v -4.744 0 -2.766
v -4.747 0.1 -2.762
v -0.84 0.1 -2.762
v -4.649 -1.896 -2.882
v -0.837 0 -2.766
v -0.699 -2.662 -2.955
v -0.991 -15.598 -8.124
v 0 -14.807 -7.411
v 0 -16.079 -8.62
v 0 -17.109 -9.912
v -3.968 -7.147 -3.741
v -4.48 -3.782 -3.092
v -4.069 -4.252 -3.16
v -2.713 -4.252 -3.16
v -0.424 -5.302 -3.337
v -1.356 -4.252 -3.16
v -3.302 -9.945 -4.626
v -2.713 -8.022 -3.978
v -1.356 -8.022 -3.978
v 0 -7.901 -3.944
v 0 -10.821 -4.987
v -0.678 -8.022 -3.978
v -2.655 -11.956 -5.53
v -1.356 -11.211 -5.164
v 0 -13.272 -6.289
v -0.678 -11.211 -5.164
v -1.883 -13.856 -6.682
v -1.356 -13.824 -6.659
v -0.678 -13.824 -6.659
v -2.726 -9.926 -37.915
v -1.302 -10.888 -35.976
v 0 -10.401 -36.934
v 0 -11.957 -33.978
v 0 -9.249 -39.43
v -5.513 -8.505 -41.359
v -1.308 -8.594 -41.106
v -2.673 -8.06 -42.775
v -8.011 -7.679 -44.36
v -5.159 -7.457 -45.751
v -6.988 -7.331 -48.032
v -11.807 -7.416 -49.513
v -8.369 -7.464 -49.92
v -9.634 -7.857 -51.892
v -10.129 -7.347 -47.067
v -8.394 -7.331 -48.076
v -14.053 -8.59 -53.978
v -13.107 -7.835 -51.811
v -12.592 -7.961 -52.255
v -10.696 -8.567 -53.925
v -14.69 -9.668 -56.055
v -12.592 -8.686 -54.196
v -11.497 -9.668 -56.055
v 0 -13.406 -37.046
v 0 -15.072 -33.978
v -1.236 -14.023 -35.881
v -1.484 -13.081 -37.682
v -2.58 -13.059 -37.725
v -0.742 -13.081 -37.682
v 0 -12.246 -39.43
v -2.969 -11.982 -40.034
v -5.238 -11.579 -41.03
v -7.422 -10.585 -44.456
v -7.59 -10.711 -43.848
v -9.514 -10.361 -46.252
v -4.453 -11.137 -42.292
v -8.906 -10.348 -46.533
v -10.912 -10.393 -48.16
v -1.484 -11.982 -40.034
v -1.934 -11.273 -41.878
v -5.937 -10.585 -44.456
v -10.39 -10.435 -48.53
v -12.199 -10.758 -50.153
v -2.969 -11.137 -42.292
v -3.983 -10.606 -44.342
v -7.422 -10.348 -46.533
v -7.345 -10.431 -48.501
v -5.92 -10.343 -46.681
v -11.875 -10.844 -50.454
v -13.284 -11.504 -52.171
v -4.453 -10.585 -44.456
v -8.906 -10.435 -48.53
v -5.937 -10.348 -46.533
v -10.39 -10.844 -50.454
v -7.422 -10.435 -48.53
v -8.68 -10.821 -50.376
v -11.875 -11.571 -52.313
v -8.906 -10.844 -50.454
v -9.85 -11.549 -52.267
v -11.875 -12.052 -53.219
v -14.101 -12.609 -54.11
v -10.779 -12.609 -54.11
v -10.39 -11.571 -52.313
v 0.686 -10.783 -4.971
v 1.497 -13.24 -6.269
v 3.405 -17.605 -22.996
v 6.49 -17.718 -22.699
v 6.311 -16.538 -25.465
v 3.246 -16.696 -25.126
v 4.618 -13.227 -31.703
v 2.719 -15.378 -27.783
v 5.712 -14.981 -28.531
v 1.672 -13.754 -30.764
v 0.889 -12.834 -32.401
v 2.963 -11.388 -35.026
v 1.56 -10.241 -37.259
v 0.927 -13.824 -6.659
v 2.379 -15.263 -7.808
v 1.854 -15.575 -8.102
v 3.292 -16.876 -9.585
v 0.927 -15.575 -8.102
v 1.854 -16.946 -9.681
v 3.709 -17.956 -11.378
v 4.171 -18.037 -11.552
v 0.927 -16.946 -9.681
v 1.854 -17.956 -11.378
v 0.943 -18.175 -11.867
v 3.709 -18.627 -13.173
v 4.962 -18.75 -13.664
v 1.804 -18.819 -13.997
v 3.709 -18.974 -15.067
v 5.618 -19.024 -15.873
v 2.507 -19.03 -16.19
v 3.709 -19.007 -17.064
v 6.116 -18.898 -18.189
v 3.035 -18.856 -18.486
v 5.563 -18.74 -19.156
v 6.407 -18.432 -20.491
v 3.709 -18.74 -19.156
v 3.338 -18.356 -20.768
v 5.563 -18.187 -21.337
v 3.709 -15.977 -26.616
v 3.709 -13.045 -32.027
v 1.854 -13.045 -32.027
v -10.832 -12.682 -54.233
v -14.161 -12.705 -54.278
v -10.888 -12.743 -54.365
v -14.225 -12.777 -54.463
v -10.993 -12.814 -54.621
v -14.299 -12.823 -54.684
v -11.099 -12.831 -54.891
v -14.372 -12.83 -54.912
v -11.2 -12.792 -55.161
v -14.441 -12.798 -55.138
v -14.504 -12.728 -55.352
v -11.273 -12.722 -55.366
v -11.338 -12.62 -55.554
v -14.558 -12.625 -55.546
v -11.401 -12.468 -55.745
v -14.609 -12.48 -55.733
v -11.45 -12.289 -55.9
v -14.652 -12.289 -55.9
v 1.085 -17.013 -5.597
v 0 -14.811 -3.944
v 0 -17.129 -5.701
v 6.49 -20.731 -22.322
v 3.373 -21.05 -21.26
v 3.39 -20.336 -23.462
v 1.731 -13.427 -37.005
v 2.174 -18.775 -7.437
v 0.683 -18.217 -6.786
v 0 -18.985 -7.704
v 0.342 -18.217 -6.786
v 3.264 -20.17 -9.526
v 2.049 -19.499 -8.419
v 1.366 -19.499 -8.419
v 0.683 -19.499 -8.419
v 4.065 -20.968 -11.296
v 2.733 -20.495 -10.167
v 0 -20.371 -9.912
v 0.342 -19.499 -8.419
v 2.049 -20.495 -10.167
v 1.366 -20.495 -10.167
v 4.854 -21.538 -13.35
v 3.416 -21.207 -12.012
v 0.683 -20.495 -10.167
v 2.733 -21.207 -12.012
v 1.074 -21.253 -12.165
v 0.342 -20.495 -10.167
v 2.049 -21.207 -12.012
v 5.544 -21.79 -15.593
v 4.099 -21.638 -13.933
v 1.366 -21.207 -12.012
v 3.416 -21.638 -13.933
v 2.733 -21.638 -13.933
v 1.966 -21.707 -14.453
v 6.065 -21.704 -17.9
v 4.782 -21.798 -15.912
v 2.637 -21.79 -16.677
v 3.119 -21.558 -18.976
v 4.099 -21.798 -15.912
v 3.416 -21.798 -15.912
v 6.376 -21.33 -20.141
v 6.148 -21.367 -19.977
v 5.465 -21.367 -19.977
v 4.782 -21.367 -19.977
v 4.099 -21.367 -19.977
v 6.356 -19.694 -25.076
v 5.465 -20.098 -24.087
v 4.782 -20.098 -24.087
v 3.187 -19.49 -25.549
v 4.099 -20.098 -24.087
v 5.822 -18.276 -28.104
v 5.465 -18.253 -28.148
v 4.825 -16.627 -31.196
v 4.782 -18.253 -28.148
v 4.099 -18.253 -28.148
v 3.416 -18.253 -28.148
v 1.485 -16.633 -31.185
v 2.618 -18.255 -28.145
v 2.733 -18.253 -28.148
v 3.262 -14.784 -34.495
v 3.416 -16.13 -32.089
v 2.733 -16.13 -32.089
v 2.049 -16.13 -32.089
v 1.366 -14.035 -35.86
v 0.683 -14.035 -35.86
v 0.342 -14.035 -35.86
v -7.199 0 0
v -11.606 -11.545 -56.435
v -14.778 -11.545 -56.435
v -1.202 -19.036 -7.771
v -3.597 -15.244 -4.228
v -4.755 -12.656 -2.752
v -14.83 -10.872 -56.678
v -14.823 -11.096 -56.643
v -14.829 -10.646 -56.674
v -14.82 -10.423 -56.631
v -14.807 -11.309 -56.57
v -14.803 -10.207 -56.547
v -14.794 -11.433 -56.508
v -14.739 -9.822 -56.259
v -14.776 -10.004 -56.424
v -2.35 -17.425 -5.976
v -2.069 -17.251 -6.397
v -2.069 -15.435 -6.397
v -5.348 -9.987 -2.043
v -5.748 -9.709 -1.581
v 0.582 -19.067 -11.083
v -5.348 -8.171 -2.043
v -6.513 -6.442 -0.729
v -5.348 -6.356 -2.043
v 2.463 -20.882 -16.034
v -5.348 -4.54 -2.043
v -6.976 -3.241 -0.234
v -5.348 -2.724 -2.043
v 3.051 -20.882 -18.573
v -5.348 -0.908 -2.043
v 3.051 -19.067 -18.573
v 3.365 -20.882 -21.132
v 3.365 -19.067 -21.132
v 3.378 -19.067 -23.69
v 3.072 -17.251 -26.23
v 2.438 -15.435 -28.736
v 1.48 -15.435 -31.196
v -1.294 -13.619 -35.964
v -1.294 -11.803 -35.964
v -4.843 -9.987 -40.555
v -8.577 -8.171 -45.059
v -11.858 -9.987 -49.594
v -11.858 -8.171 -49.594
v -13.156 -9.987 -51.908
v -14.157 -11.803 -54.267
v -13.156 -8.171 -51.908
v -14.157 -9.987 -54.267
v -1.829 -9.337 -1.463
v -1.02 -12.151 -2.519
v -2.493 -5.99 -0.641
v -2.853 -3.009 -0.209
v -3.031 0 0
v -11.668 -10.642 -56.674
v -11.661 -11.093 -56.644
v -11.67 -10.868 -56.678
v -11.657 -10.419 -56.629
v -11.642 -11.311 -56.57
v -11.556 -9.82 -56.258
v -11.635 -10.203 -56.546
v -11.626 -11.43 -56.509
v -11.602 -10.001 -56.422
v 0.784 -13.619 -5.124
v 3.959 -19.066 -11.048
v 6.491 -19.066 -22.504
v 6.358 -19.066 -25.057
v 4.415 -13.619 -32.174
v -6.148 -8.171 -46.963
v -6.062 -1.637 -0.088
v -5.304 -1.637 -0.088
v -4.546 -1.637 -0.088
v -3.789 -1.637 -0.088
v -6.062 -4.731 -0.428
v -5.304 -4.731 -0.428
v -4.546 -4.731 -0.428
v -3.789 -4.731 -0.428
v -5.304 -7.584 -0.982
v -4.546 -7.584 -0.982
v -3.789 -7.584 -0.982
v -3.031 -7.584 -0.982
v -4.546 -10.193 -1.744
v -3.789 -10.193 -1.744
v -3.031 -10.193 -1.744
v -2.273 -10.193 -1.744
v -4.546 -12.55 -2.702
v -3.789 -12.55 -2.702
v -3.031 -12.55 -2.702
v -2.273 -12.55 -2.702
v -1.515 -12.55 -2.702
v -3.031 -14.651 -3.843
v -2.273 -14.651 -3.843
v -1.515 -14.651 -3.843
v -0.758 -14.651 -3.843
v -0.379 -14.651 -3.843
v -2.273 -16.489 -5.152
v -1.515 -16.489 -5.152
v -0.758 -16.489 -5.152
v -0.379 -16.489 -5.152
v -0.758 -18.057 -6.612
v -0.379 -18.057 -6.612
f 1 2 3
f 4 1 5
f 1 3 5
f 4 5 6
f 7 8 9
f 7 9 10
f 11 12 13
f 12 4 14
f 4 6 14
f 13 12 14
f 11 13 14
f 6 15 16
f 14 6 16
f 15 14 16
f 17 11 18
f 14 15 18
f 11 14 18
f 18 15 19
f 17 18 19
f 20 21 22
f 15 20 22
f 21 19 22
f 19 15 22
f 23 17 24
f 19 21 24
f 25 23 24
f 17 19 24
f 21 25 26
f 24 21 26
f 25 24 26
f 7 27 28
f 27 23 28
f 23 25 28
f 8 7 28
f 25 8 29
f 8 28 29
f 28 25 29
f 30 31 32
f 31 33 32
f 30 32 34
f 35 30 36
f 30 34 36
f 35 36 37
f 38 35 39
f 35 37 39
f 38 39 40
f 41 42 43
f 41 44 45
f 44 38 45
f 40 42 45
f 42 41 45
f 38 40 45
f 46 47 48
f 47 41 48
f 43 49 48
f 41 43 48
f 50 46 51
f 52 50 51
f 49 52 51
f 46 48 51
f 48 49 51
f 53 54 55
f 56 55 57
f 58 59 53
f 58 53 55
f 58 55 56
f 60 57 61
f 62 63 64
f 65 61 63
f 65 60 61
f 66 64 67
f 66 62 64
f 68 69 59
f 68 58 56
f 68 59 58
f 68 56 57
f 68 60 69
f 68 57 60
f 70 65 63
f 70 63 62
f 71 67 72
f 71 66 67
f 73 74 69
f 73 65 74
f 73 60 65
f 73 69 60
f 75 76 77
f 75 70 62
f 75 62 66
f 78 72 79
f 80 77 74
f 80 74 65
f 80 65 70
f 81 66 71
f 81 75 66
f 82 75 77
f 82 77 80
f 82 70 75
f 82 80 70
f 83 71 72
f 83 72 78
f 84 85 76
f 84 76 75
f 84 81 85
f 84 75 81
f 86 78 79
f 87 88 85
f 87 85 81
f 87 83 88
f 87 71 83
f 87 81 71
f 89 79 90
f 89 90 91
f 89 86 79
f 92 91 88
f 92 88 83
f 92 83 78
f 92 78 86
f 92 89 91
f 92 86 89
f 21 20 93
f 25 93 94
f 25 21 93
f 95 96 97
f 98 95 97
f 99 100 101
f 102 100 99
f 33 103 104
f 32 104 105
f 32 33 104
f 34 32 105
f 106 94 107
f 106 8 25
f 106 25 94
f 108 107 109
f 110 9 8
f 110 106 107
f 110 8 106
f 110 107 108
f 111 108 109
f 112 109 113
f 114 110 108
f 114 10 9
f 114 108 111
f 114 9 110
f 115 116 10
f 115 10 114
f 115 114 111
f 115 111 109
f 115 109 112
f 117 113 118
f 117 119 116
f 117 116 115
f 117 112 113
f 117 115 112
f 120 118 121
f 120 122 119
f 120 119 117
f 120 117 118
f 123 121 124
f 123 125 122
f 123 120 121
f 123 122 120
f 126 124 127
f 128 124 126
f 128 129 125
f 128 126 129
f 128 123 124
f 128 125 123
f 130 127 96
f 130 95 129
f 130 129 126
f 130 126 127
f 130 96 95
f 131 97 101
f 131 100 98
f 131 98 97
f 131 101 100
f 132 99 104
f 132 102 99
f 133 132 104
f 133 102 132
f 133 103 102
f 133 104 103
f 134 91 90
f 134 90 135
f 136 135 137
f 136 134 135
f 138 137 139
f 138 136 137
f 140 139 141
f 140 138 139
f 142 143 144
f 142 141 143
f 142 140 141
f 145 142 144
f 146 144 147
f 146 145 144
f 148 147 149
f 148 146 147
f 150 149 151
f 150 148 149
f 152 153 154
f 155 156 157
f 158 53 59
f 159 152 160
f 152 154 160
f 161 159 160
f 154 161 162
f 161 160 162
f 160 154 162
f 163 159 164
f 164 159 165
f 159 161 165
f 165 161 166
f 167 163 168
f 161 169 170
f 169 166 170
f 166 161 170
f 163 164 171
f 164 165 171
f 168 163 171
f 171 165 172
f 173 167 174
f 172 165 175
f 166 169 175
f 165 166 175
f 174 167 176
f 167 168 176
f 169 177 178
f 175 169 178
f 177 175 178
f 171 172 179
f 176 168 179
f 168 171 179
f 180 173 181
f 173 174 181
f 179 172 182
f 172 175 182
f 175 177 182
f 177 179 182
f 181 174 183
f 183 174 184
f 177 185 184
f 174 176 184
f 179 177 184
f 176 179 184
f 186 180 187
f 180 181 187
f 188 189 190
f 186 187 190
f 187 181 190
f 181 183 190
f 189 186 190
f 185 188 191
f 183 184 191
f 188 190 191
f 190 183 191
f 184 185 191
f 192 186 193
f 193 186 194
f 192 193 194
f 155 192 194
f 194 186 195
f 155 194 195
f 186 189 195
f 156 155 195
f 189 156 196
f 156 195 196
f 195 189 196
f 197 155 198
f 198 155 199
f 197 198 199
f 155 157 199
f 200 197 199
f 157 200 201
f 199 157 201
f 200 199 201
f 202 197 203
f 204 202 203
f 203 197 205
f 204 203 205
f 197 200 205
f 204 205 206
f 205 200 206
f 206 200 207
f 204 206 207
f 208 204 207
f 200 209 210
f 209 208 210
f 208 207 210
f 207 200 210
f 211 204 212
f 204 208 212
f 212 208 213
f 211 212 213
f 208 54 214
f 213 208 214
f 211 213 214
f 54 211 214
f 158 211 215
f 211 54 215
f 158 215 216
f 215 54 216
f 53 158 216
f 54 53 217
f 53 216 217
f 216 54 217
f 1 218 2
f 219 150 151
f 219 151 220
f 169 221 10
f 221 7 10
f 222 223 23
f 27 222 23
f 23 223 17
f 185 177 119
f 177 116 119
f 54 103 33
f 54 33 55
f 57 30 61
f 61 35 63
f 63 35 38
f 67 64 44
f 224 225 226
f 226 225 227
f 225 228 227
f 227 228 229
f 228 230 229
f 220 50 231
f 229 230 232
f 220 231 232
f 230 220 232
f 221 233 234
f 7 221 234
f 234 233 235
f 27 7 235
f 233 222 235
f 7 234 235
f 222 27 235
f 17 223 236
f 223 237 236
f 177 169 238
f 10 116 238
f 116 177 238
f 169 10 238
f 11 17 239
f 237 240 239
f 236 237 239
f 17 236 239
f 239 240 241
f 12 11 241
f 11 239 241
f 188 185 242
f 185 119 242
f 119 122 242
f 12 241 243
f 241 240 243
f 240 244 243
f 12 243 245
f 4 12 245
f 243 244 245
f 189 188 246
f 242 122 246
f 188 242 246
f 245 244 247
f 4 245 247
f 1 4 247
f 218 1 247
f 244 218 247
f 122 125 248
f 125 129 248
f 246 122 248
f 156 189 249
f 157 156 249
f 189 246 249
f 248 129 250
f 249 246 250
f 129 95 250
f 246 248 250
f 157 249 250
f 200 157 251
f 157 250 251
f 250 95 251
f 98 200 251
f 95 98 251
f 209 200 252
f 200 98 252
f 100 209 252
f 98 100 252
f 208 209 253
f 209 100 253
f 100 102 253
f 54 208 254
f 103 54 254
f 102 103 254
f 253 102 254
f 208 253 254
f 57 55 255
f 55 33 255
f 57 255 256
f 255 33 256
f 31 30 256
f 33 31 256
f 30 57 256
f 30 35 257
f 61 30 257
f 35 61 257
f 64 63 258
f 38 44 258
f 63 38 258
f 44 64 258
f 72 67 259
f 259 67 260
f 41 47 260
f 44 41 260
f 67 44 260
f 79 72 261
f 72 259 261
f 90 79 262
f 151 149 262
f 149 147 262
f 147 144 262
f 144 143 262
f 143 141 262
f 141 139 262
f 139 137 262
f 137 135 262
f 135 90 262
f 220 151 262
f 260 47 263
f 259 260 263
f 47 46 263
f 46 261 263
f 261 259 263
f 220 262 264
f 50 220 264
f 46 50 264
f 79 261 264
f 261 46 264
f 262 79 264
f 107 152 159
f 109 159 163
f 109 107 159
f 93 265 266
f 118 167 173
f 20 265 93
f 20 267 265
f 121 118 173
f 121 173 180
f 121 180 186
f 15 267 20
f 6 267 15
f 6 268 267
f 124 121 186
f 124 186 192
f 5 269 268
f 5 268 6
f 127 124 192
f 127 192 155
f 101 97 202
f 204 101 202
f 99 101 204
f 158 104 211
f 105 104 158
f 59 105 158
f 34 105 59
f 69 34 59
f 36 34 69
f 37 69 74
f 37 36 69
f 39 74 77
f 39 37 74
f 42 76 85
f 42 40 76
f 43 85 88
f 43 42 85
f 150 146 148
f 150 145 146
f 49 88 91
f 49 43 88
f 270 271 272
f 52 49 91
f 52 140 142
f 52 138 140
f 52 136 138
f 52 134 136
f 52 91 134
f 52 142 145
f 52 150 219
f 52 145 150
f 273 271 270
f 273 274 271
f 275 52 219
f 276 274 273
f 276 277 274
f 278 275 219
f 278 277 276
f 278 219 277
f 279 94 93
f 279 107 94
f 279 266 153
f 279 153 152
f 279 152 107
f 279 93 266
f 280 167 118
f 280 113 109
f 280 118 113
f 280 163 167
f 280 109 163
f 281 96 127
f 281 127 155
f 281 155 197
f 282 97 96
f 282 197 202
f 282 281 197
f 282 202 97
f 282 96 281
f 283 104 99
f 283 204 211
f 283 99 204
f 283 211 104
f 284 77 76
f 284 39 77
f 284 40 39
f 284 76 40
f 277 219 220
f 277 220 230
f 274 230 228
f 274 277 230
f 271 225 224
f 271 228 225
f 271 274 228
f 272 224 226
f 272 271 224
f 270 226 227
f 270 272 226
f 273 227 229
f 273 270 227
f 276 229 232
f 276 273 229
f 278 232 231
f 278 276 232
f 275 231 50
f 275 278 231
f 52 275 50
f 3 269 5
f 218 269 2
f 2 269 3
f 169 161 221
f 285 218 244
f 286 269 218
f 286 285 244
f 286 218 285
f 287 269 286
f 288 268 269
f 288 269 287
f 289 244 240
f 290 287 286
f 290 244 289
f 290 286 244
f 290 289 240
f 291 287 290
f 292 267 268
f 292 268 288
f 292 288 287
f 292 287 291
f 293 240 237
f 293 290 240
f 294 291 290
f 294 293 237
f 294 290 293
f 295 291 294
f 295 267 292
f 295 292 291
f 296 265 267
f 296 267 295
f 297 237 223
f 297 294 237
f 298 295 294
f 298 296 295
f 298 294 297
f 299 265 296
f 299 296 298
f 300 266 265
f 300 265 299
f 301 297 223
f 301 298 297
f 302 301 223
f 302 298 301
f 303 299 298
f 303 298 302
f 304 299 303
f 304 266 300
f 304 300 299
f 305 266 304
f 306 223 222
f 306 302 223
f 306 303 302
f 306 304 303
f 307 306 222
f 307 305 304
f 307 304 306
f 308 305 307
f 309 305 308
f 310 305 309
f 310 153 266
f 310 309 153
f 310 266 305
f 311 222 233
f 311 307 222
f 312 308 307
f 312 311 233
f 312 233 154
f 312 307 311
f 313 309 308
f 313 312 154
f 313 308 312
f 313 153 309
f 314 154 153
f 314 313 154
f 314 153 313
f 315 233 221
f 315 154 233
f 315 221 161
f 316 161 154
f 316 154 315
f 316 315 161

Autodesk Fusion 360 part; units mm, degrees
sketch "Sketch1" plane through (0, 0, 0) normal (1, 0, 0) x (0, 1, 0)
  spline S0 degree 5 poles (0, 0) (-1.5461, -0.056) (-4.5103, -0.2863) (-8.5728, -0.9868) (-13.2055, -2.6049) (-17.6093, -5.6119) (-20.5447, -9.3915) (-21.9764, -13.7078) (-21.9581, -18.3281) (-20.7021, -23.054) (-18.5832, -27.735) (-16.0525, -32.2598) (-13.5801, -36.5535) (-11.5892, -40.5752) (-10.3932, -44.316) (-10.1254, -47.8001) (-10.6672, -50.4131) (-11.4827, -52.2914) (-12.2041, -53.5097) (-12.6092, -54.1104) knots 0 0 0 0 0 0 0.066667 0.133333 0.2 0.266667 0.333333 0.4 0.466667 0.533333 0.6 0.666667 0.733333 0.8 0.866667 0.933333 1 1 1 1 1 1
  line L0 (10.2739, 0.3719) -> (-10.2739, -0.3719)
  spline S1 degree 3 poles (0.1, -2.7622) (-6.0917, -2.9863) (-10.7245, -4.4824) (-13.8238, -6.6593) (-16.4227, -8.4848) (-17.9499, -10.7212) (-18.6267, -13.1732) (-19.304, -15.6268) (-19.1099, -18.3726) (-18.1871, -21.3366) (-17.1185, -24.7688) (-15.0764, -28.4198) (-13.0449, -32.0268) (-10.8363, -35.9482) (-8.7042, -39.8469) (-7.8006, -43.7909) (-7.1465, -46.6457) (-7.1496, -49.5409) (-7.9606, -52.2548) (-8.3548, -53.5742) (-8.9304, -54.8446) (-9.6679, -56.0549) knots 0 0 0 0 0.16767 0.16767 0.16767 0.30827 0.30827 0.30827 0.448963 0.448963 0.448963 0.611881 0.611881 0.611881 0.789001 0.789001 0.789001 0.917212 0.917212 0.917212 0.979548 0.979548 0.979548 0.979548
  line L1 (-12.2892, -55.9) -> (-11.545, -56.4354)
  line L2 (0, 0) -> (0.1, -2.7622)
  arc A0 (-12.6092, -54.1104) -> (-12.2892, -55.9) centre (-11.5269, -54.8403) ccw
  arc A1 (-11.545, -56.4354) -> (-9.6679, -56.0549) centre (-10.7827, -55.3757) ccw
  point P0 (-11.7402, -40.6199)
  dimension "d2" = 1.3054
sketch "Sketch2" plane through (0, 0, 0) normal (0, 1, 0) x (1, 0, 0)
  spline S0 degree 5 poles (-12.1026, -4.473) (-11.4157, -3.9229) (-10.0727, -2.8011) (-8.1507, -1.0537) (-5.7739, 1.4062) (-3.1241, 4.6972) (-0.8218, 8.197) (1.0858, 11.8869) (2.526, 15.7315) (3.3928, 19.6719) (3.574, 23.6369) (2.9838, 27.5566) (1.5945, 31.3748) (-0.5288, 35.0626) (-3.1973, 38.6306) (-6.1455, 42.1158) (-9.0701, 45.5713) (-11.6717, 49.0549) (-13.6924, 52.6195) (-14.9643, 56.3) (-15.3996, 60.1153) (-15.05, 63.2818) (-14.3933, 65.7216) (-13.7809, 67.3768) (-13.431, 68.2116) knots 0 0 0 0 0 0 0.05 0.1 0.15 0.2 0.25 0.3 0.35 0.4 0.45 0.5 0.55 0.6 0.65 0.7 0.75 0.8 0.85 0.9 0.95 1 1 1 1 1 1
  spline S1 degree 3 poles (-10.1736, -6.8817) (-5.8254, -3.3995) (-2.1215, 0.602) (0.7843, 5.1235) (3.2088, 8.8961) (5.0948, 13.0413) (5.978, 17.4473) (6.6428, 20.764) (6.6923, 24.2313) (5.9419, 27.5965) (5.2452, 30.7205) (3.8541, 33.7189) (2.0777, 36.4763) (-0.3869, 40.3021) (-3.5439, 43.7195) (-6.1481, 46.9634) (-8.2297, 49.5562) (-9.9166, 52.025) (-10.9152, 54.4302) (-12.1481, 57.3997) (-12.4388, 60.2799) (-11.7039, 63.5633) (-11.4557, 64.6723) (-11.0858, 65.8238) (-10.585, 67.0188) knots 0 0 0 0 0.179562 0.179562 0.179562 0.329386 0.329386 0.329386 0.442169 0.442169 0.442169 0.546866 0.546866 0.546866 0.692126 0.692126 0.692126 0.808235 0.808235 0.808235 0.951586 0.951586 0.951586 1 1 1 1
  line L0 (-10.1736, -6.8817) -> (-12.1026, -4.473)
  line L1 (-10.585, 67.0188) -> (-13.431, 68.2116)
  point P0 (1.1818, 12.4171)
  point P1 (1.5613, 31.0153)
  point P2 (-12.1026, 49.993)
  dimension "d8" = 3.0859
extrude "Extrude1" add sketch "Sketch2" along normal mid plane 90.686 makes body 1
extrude "Extrude2" add sketch "Sketch1" along normal mid plane 63.566 separate body makes body 2
combine "Combine1" operation intersect target body 1 tool bodies 2
